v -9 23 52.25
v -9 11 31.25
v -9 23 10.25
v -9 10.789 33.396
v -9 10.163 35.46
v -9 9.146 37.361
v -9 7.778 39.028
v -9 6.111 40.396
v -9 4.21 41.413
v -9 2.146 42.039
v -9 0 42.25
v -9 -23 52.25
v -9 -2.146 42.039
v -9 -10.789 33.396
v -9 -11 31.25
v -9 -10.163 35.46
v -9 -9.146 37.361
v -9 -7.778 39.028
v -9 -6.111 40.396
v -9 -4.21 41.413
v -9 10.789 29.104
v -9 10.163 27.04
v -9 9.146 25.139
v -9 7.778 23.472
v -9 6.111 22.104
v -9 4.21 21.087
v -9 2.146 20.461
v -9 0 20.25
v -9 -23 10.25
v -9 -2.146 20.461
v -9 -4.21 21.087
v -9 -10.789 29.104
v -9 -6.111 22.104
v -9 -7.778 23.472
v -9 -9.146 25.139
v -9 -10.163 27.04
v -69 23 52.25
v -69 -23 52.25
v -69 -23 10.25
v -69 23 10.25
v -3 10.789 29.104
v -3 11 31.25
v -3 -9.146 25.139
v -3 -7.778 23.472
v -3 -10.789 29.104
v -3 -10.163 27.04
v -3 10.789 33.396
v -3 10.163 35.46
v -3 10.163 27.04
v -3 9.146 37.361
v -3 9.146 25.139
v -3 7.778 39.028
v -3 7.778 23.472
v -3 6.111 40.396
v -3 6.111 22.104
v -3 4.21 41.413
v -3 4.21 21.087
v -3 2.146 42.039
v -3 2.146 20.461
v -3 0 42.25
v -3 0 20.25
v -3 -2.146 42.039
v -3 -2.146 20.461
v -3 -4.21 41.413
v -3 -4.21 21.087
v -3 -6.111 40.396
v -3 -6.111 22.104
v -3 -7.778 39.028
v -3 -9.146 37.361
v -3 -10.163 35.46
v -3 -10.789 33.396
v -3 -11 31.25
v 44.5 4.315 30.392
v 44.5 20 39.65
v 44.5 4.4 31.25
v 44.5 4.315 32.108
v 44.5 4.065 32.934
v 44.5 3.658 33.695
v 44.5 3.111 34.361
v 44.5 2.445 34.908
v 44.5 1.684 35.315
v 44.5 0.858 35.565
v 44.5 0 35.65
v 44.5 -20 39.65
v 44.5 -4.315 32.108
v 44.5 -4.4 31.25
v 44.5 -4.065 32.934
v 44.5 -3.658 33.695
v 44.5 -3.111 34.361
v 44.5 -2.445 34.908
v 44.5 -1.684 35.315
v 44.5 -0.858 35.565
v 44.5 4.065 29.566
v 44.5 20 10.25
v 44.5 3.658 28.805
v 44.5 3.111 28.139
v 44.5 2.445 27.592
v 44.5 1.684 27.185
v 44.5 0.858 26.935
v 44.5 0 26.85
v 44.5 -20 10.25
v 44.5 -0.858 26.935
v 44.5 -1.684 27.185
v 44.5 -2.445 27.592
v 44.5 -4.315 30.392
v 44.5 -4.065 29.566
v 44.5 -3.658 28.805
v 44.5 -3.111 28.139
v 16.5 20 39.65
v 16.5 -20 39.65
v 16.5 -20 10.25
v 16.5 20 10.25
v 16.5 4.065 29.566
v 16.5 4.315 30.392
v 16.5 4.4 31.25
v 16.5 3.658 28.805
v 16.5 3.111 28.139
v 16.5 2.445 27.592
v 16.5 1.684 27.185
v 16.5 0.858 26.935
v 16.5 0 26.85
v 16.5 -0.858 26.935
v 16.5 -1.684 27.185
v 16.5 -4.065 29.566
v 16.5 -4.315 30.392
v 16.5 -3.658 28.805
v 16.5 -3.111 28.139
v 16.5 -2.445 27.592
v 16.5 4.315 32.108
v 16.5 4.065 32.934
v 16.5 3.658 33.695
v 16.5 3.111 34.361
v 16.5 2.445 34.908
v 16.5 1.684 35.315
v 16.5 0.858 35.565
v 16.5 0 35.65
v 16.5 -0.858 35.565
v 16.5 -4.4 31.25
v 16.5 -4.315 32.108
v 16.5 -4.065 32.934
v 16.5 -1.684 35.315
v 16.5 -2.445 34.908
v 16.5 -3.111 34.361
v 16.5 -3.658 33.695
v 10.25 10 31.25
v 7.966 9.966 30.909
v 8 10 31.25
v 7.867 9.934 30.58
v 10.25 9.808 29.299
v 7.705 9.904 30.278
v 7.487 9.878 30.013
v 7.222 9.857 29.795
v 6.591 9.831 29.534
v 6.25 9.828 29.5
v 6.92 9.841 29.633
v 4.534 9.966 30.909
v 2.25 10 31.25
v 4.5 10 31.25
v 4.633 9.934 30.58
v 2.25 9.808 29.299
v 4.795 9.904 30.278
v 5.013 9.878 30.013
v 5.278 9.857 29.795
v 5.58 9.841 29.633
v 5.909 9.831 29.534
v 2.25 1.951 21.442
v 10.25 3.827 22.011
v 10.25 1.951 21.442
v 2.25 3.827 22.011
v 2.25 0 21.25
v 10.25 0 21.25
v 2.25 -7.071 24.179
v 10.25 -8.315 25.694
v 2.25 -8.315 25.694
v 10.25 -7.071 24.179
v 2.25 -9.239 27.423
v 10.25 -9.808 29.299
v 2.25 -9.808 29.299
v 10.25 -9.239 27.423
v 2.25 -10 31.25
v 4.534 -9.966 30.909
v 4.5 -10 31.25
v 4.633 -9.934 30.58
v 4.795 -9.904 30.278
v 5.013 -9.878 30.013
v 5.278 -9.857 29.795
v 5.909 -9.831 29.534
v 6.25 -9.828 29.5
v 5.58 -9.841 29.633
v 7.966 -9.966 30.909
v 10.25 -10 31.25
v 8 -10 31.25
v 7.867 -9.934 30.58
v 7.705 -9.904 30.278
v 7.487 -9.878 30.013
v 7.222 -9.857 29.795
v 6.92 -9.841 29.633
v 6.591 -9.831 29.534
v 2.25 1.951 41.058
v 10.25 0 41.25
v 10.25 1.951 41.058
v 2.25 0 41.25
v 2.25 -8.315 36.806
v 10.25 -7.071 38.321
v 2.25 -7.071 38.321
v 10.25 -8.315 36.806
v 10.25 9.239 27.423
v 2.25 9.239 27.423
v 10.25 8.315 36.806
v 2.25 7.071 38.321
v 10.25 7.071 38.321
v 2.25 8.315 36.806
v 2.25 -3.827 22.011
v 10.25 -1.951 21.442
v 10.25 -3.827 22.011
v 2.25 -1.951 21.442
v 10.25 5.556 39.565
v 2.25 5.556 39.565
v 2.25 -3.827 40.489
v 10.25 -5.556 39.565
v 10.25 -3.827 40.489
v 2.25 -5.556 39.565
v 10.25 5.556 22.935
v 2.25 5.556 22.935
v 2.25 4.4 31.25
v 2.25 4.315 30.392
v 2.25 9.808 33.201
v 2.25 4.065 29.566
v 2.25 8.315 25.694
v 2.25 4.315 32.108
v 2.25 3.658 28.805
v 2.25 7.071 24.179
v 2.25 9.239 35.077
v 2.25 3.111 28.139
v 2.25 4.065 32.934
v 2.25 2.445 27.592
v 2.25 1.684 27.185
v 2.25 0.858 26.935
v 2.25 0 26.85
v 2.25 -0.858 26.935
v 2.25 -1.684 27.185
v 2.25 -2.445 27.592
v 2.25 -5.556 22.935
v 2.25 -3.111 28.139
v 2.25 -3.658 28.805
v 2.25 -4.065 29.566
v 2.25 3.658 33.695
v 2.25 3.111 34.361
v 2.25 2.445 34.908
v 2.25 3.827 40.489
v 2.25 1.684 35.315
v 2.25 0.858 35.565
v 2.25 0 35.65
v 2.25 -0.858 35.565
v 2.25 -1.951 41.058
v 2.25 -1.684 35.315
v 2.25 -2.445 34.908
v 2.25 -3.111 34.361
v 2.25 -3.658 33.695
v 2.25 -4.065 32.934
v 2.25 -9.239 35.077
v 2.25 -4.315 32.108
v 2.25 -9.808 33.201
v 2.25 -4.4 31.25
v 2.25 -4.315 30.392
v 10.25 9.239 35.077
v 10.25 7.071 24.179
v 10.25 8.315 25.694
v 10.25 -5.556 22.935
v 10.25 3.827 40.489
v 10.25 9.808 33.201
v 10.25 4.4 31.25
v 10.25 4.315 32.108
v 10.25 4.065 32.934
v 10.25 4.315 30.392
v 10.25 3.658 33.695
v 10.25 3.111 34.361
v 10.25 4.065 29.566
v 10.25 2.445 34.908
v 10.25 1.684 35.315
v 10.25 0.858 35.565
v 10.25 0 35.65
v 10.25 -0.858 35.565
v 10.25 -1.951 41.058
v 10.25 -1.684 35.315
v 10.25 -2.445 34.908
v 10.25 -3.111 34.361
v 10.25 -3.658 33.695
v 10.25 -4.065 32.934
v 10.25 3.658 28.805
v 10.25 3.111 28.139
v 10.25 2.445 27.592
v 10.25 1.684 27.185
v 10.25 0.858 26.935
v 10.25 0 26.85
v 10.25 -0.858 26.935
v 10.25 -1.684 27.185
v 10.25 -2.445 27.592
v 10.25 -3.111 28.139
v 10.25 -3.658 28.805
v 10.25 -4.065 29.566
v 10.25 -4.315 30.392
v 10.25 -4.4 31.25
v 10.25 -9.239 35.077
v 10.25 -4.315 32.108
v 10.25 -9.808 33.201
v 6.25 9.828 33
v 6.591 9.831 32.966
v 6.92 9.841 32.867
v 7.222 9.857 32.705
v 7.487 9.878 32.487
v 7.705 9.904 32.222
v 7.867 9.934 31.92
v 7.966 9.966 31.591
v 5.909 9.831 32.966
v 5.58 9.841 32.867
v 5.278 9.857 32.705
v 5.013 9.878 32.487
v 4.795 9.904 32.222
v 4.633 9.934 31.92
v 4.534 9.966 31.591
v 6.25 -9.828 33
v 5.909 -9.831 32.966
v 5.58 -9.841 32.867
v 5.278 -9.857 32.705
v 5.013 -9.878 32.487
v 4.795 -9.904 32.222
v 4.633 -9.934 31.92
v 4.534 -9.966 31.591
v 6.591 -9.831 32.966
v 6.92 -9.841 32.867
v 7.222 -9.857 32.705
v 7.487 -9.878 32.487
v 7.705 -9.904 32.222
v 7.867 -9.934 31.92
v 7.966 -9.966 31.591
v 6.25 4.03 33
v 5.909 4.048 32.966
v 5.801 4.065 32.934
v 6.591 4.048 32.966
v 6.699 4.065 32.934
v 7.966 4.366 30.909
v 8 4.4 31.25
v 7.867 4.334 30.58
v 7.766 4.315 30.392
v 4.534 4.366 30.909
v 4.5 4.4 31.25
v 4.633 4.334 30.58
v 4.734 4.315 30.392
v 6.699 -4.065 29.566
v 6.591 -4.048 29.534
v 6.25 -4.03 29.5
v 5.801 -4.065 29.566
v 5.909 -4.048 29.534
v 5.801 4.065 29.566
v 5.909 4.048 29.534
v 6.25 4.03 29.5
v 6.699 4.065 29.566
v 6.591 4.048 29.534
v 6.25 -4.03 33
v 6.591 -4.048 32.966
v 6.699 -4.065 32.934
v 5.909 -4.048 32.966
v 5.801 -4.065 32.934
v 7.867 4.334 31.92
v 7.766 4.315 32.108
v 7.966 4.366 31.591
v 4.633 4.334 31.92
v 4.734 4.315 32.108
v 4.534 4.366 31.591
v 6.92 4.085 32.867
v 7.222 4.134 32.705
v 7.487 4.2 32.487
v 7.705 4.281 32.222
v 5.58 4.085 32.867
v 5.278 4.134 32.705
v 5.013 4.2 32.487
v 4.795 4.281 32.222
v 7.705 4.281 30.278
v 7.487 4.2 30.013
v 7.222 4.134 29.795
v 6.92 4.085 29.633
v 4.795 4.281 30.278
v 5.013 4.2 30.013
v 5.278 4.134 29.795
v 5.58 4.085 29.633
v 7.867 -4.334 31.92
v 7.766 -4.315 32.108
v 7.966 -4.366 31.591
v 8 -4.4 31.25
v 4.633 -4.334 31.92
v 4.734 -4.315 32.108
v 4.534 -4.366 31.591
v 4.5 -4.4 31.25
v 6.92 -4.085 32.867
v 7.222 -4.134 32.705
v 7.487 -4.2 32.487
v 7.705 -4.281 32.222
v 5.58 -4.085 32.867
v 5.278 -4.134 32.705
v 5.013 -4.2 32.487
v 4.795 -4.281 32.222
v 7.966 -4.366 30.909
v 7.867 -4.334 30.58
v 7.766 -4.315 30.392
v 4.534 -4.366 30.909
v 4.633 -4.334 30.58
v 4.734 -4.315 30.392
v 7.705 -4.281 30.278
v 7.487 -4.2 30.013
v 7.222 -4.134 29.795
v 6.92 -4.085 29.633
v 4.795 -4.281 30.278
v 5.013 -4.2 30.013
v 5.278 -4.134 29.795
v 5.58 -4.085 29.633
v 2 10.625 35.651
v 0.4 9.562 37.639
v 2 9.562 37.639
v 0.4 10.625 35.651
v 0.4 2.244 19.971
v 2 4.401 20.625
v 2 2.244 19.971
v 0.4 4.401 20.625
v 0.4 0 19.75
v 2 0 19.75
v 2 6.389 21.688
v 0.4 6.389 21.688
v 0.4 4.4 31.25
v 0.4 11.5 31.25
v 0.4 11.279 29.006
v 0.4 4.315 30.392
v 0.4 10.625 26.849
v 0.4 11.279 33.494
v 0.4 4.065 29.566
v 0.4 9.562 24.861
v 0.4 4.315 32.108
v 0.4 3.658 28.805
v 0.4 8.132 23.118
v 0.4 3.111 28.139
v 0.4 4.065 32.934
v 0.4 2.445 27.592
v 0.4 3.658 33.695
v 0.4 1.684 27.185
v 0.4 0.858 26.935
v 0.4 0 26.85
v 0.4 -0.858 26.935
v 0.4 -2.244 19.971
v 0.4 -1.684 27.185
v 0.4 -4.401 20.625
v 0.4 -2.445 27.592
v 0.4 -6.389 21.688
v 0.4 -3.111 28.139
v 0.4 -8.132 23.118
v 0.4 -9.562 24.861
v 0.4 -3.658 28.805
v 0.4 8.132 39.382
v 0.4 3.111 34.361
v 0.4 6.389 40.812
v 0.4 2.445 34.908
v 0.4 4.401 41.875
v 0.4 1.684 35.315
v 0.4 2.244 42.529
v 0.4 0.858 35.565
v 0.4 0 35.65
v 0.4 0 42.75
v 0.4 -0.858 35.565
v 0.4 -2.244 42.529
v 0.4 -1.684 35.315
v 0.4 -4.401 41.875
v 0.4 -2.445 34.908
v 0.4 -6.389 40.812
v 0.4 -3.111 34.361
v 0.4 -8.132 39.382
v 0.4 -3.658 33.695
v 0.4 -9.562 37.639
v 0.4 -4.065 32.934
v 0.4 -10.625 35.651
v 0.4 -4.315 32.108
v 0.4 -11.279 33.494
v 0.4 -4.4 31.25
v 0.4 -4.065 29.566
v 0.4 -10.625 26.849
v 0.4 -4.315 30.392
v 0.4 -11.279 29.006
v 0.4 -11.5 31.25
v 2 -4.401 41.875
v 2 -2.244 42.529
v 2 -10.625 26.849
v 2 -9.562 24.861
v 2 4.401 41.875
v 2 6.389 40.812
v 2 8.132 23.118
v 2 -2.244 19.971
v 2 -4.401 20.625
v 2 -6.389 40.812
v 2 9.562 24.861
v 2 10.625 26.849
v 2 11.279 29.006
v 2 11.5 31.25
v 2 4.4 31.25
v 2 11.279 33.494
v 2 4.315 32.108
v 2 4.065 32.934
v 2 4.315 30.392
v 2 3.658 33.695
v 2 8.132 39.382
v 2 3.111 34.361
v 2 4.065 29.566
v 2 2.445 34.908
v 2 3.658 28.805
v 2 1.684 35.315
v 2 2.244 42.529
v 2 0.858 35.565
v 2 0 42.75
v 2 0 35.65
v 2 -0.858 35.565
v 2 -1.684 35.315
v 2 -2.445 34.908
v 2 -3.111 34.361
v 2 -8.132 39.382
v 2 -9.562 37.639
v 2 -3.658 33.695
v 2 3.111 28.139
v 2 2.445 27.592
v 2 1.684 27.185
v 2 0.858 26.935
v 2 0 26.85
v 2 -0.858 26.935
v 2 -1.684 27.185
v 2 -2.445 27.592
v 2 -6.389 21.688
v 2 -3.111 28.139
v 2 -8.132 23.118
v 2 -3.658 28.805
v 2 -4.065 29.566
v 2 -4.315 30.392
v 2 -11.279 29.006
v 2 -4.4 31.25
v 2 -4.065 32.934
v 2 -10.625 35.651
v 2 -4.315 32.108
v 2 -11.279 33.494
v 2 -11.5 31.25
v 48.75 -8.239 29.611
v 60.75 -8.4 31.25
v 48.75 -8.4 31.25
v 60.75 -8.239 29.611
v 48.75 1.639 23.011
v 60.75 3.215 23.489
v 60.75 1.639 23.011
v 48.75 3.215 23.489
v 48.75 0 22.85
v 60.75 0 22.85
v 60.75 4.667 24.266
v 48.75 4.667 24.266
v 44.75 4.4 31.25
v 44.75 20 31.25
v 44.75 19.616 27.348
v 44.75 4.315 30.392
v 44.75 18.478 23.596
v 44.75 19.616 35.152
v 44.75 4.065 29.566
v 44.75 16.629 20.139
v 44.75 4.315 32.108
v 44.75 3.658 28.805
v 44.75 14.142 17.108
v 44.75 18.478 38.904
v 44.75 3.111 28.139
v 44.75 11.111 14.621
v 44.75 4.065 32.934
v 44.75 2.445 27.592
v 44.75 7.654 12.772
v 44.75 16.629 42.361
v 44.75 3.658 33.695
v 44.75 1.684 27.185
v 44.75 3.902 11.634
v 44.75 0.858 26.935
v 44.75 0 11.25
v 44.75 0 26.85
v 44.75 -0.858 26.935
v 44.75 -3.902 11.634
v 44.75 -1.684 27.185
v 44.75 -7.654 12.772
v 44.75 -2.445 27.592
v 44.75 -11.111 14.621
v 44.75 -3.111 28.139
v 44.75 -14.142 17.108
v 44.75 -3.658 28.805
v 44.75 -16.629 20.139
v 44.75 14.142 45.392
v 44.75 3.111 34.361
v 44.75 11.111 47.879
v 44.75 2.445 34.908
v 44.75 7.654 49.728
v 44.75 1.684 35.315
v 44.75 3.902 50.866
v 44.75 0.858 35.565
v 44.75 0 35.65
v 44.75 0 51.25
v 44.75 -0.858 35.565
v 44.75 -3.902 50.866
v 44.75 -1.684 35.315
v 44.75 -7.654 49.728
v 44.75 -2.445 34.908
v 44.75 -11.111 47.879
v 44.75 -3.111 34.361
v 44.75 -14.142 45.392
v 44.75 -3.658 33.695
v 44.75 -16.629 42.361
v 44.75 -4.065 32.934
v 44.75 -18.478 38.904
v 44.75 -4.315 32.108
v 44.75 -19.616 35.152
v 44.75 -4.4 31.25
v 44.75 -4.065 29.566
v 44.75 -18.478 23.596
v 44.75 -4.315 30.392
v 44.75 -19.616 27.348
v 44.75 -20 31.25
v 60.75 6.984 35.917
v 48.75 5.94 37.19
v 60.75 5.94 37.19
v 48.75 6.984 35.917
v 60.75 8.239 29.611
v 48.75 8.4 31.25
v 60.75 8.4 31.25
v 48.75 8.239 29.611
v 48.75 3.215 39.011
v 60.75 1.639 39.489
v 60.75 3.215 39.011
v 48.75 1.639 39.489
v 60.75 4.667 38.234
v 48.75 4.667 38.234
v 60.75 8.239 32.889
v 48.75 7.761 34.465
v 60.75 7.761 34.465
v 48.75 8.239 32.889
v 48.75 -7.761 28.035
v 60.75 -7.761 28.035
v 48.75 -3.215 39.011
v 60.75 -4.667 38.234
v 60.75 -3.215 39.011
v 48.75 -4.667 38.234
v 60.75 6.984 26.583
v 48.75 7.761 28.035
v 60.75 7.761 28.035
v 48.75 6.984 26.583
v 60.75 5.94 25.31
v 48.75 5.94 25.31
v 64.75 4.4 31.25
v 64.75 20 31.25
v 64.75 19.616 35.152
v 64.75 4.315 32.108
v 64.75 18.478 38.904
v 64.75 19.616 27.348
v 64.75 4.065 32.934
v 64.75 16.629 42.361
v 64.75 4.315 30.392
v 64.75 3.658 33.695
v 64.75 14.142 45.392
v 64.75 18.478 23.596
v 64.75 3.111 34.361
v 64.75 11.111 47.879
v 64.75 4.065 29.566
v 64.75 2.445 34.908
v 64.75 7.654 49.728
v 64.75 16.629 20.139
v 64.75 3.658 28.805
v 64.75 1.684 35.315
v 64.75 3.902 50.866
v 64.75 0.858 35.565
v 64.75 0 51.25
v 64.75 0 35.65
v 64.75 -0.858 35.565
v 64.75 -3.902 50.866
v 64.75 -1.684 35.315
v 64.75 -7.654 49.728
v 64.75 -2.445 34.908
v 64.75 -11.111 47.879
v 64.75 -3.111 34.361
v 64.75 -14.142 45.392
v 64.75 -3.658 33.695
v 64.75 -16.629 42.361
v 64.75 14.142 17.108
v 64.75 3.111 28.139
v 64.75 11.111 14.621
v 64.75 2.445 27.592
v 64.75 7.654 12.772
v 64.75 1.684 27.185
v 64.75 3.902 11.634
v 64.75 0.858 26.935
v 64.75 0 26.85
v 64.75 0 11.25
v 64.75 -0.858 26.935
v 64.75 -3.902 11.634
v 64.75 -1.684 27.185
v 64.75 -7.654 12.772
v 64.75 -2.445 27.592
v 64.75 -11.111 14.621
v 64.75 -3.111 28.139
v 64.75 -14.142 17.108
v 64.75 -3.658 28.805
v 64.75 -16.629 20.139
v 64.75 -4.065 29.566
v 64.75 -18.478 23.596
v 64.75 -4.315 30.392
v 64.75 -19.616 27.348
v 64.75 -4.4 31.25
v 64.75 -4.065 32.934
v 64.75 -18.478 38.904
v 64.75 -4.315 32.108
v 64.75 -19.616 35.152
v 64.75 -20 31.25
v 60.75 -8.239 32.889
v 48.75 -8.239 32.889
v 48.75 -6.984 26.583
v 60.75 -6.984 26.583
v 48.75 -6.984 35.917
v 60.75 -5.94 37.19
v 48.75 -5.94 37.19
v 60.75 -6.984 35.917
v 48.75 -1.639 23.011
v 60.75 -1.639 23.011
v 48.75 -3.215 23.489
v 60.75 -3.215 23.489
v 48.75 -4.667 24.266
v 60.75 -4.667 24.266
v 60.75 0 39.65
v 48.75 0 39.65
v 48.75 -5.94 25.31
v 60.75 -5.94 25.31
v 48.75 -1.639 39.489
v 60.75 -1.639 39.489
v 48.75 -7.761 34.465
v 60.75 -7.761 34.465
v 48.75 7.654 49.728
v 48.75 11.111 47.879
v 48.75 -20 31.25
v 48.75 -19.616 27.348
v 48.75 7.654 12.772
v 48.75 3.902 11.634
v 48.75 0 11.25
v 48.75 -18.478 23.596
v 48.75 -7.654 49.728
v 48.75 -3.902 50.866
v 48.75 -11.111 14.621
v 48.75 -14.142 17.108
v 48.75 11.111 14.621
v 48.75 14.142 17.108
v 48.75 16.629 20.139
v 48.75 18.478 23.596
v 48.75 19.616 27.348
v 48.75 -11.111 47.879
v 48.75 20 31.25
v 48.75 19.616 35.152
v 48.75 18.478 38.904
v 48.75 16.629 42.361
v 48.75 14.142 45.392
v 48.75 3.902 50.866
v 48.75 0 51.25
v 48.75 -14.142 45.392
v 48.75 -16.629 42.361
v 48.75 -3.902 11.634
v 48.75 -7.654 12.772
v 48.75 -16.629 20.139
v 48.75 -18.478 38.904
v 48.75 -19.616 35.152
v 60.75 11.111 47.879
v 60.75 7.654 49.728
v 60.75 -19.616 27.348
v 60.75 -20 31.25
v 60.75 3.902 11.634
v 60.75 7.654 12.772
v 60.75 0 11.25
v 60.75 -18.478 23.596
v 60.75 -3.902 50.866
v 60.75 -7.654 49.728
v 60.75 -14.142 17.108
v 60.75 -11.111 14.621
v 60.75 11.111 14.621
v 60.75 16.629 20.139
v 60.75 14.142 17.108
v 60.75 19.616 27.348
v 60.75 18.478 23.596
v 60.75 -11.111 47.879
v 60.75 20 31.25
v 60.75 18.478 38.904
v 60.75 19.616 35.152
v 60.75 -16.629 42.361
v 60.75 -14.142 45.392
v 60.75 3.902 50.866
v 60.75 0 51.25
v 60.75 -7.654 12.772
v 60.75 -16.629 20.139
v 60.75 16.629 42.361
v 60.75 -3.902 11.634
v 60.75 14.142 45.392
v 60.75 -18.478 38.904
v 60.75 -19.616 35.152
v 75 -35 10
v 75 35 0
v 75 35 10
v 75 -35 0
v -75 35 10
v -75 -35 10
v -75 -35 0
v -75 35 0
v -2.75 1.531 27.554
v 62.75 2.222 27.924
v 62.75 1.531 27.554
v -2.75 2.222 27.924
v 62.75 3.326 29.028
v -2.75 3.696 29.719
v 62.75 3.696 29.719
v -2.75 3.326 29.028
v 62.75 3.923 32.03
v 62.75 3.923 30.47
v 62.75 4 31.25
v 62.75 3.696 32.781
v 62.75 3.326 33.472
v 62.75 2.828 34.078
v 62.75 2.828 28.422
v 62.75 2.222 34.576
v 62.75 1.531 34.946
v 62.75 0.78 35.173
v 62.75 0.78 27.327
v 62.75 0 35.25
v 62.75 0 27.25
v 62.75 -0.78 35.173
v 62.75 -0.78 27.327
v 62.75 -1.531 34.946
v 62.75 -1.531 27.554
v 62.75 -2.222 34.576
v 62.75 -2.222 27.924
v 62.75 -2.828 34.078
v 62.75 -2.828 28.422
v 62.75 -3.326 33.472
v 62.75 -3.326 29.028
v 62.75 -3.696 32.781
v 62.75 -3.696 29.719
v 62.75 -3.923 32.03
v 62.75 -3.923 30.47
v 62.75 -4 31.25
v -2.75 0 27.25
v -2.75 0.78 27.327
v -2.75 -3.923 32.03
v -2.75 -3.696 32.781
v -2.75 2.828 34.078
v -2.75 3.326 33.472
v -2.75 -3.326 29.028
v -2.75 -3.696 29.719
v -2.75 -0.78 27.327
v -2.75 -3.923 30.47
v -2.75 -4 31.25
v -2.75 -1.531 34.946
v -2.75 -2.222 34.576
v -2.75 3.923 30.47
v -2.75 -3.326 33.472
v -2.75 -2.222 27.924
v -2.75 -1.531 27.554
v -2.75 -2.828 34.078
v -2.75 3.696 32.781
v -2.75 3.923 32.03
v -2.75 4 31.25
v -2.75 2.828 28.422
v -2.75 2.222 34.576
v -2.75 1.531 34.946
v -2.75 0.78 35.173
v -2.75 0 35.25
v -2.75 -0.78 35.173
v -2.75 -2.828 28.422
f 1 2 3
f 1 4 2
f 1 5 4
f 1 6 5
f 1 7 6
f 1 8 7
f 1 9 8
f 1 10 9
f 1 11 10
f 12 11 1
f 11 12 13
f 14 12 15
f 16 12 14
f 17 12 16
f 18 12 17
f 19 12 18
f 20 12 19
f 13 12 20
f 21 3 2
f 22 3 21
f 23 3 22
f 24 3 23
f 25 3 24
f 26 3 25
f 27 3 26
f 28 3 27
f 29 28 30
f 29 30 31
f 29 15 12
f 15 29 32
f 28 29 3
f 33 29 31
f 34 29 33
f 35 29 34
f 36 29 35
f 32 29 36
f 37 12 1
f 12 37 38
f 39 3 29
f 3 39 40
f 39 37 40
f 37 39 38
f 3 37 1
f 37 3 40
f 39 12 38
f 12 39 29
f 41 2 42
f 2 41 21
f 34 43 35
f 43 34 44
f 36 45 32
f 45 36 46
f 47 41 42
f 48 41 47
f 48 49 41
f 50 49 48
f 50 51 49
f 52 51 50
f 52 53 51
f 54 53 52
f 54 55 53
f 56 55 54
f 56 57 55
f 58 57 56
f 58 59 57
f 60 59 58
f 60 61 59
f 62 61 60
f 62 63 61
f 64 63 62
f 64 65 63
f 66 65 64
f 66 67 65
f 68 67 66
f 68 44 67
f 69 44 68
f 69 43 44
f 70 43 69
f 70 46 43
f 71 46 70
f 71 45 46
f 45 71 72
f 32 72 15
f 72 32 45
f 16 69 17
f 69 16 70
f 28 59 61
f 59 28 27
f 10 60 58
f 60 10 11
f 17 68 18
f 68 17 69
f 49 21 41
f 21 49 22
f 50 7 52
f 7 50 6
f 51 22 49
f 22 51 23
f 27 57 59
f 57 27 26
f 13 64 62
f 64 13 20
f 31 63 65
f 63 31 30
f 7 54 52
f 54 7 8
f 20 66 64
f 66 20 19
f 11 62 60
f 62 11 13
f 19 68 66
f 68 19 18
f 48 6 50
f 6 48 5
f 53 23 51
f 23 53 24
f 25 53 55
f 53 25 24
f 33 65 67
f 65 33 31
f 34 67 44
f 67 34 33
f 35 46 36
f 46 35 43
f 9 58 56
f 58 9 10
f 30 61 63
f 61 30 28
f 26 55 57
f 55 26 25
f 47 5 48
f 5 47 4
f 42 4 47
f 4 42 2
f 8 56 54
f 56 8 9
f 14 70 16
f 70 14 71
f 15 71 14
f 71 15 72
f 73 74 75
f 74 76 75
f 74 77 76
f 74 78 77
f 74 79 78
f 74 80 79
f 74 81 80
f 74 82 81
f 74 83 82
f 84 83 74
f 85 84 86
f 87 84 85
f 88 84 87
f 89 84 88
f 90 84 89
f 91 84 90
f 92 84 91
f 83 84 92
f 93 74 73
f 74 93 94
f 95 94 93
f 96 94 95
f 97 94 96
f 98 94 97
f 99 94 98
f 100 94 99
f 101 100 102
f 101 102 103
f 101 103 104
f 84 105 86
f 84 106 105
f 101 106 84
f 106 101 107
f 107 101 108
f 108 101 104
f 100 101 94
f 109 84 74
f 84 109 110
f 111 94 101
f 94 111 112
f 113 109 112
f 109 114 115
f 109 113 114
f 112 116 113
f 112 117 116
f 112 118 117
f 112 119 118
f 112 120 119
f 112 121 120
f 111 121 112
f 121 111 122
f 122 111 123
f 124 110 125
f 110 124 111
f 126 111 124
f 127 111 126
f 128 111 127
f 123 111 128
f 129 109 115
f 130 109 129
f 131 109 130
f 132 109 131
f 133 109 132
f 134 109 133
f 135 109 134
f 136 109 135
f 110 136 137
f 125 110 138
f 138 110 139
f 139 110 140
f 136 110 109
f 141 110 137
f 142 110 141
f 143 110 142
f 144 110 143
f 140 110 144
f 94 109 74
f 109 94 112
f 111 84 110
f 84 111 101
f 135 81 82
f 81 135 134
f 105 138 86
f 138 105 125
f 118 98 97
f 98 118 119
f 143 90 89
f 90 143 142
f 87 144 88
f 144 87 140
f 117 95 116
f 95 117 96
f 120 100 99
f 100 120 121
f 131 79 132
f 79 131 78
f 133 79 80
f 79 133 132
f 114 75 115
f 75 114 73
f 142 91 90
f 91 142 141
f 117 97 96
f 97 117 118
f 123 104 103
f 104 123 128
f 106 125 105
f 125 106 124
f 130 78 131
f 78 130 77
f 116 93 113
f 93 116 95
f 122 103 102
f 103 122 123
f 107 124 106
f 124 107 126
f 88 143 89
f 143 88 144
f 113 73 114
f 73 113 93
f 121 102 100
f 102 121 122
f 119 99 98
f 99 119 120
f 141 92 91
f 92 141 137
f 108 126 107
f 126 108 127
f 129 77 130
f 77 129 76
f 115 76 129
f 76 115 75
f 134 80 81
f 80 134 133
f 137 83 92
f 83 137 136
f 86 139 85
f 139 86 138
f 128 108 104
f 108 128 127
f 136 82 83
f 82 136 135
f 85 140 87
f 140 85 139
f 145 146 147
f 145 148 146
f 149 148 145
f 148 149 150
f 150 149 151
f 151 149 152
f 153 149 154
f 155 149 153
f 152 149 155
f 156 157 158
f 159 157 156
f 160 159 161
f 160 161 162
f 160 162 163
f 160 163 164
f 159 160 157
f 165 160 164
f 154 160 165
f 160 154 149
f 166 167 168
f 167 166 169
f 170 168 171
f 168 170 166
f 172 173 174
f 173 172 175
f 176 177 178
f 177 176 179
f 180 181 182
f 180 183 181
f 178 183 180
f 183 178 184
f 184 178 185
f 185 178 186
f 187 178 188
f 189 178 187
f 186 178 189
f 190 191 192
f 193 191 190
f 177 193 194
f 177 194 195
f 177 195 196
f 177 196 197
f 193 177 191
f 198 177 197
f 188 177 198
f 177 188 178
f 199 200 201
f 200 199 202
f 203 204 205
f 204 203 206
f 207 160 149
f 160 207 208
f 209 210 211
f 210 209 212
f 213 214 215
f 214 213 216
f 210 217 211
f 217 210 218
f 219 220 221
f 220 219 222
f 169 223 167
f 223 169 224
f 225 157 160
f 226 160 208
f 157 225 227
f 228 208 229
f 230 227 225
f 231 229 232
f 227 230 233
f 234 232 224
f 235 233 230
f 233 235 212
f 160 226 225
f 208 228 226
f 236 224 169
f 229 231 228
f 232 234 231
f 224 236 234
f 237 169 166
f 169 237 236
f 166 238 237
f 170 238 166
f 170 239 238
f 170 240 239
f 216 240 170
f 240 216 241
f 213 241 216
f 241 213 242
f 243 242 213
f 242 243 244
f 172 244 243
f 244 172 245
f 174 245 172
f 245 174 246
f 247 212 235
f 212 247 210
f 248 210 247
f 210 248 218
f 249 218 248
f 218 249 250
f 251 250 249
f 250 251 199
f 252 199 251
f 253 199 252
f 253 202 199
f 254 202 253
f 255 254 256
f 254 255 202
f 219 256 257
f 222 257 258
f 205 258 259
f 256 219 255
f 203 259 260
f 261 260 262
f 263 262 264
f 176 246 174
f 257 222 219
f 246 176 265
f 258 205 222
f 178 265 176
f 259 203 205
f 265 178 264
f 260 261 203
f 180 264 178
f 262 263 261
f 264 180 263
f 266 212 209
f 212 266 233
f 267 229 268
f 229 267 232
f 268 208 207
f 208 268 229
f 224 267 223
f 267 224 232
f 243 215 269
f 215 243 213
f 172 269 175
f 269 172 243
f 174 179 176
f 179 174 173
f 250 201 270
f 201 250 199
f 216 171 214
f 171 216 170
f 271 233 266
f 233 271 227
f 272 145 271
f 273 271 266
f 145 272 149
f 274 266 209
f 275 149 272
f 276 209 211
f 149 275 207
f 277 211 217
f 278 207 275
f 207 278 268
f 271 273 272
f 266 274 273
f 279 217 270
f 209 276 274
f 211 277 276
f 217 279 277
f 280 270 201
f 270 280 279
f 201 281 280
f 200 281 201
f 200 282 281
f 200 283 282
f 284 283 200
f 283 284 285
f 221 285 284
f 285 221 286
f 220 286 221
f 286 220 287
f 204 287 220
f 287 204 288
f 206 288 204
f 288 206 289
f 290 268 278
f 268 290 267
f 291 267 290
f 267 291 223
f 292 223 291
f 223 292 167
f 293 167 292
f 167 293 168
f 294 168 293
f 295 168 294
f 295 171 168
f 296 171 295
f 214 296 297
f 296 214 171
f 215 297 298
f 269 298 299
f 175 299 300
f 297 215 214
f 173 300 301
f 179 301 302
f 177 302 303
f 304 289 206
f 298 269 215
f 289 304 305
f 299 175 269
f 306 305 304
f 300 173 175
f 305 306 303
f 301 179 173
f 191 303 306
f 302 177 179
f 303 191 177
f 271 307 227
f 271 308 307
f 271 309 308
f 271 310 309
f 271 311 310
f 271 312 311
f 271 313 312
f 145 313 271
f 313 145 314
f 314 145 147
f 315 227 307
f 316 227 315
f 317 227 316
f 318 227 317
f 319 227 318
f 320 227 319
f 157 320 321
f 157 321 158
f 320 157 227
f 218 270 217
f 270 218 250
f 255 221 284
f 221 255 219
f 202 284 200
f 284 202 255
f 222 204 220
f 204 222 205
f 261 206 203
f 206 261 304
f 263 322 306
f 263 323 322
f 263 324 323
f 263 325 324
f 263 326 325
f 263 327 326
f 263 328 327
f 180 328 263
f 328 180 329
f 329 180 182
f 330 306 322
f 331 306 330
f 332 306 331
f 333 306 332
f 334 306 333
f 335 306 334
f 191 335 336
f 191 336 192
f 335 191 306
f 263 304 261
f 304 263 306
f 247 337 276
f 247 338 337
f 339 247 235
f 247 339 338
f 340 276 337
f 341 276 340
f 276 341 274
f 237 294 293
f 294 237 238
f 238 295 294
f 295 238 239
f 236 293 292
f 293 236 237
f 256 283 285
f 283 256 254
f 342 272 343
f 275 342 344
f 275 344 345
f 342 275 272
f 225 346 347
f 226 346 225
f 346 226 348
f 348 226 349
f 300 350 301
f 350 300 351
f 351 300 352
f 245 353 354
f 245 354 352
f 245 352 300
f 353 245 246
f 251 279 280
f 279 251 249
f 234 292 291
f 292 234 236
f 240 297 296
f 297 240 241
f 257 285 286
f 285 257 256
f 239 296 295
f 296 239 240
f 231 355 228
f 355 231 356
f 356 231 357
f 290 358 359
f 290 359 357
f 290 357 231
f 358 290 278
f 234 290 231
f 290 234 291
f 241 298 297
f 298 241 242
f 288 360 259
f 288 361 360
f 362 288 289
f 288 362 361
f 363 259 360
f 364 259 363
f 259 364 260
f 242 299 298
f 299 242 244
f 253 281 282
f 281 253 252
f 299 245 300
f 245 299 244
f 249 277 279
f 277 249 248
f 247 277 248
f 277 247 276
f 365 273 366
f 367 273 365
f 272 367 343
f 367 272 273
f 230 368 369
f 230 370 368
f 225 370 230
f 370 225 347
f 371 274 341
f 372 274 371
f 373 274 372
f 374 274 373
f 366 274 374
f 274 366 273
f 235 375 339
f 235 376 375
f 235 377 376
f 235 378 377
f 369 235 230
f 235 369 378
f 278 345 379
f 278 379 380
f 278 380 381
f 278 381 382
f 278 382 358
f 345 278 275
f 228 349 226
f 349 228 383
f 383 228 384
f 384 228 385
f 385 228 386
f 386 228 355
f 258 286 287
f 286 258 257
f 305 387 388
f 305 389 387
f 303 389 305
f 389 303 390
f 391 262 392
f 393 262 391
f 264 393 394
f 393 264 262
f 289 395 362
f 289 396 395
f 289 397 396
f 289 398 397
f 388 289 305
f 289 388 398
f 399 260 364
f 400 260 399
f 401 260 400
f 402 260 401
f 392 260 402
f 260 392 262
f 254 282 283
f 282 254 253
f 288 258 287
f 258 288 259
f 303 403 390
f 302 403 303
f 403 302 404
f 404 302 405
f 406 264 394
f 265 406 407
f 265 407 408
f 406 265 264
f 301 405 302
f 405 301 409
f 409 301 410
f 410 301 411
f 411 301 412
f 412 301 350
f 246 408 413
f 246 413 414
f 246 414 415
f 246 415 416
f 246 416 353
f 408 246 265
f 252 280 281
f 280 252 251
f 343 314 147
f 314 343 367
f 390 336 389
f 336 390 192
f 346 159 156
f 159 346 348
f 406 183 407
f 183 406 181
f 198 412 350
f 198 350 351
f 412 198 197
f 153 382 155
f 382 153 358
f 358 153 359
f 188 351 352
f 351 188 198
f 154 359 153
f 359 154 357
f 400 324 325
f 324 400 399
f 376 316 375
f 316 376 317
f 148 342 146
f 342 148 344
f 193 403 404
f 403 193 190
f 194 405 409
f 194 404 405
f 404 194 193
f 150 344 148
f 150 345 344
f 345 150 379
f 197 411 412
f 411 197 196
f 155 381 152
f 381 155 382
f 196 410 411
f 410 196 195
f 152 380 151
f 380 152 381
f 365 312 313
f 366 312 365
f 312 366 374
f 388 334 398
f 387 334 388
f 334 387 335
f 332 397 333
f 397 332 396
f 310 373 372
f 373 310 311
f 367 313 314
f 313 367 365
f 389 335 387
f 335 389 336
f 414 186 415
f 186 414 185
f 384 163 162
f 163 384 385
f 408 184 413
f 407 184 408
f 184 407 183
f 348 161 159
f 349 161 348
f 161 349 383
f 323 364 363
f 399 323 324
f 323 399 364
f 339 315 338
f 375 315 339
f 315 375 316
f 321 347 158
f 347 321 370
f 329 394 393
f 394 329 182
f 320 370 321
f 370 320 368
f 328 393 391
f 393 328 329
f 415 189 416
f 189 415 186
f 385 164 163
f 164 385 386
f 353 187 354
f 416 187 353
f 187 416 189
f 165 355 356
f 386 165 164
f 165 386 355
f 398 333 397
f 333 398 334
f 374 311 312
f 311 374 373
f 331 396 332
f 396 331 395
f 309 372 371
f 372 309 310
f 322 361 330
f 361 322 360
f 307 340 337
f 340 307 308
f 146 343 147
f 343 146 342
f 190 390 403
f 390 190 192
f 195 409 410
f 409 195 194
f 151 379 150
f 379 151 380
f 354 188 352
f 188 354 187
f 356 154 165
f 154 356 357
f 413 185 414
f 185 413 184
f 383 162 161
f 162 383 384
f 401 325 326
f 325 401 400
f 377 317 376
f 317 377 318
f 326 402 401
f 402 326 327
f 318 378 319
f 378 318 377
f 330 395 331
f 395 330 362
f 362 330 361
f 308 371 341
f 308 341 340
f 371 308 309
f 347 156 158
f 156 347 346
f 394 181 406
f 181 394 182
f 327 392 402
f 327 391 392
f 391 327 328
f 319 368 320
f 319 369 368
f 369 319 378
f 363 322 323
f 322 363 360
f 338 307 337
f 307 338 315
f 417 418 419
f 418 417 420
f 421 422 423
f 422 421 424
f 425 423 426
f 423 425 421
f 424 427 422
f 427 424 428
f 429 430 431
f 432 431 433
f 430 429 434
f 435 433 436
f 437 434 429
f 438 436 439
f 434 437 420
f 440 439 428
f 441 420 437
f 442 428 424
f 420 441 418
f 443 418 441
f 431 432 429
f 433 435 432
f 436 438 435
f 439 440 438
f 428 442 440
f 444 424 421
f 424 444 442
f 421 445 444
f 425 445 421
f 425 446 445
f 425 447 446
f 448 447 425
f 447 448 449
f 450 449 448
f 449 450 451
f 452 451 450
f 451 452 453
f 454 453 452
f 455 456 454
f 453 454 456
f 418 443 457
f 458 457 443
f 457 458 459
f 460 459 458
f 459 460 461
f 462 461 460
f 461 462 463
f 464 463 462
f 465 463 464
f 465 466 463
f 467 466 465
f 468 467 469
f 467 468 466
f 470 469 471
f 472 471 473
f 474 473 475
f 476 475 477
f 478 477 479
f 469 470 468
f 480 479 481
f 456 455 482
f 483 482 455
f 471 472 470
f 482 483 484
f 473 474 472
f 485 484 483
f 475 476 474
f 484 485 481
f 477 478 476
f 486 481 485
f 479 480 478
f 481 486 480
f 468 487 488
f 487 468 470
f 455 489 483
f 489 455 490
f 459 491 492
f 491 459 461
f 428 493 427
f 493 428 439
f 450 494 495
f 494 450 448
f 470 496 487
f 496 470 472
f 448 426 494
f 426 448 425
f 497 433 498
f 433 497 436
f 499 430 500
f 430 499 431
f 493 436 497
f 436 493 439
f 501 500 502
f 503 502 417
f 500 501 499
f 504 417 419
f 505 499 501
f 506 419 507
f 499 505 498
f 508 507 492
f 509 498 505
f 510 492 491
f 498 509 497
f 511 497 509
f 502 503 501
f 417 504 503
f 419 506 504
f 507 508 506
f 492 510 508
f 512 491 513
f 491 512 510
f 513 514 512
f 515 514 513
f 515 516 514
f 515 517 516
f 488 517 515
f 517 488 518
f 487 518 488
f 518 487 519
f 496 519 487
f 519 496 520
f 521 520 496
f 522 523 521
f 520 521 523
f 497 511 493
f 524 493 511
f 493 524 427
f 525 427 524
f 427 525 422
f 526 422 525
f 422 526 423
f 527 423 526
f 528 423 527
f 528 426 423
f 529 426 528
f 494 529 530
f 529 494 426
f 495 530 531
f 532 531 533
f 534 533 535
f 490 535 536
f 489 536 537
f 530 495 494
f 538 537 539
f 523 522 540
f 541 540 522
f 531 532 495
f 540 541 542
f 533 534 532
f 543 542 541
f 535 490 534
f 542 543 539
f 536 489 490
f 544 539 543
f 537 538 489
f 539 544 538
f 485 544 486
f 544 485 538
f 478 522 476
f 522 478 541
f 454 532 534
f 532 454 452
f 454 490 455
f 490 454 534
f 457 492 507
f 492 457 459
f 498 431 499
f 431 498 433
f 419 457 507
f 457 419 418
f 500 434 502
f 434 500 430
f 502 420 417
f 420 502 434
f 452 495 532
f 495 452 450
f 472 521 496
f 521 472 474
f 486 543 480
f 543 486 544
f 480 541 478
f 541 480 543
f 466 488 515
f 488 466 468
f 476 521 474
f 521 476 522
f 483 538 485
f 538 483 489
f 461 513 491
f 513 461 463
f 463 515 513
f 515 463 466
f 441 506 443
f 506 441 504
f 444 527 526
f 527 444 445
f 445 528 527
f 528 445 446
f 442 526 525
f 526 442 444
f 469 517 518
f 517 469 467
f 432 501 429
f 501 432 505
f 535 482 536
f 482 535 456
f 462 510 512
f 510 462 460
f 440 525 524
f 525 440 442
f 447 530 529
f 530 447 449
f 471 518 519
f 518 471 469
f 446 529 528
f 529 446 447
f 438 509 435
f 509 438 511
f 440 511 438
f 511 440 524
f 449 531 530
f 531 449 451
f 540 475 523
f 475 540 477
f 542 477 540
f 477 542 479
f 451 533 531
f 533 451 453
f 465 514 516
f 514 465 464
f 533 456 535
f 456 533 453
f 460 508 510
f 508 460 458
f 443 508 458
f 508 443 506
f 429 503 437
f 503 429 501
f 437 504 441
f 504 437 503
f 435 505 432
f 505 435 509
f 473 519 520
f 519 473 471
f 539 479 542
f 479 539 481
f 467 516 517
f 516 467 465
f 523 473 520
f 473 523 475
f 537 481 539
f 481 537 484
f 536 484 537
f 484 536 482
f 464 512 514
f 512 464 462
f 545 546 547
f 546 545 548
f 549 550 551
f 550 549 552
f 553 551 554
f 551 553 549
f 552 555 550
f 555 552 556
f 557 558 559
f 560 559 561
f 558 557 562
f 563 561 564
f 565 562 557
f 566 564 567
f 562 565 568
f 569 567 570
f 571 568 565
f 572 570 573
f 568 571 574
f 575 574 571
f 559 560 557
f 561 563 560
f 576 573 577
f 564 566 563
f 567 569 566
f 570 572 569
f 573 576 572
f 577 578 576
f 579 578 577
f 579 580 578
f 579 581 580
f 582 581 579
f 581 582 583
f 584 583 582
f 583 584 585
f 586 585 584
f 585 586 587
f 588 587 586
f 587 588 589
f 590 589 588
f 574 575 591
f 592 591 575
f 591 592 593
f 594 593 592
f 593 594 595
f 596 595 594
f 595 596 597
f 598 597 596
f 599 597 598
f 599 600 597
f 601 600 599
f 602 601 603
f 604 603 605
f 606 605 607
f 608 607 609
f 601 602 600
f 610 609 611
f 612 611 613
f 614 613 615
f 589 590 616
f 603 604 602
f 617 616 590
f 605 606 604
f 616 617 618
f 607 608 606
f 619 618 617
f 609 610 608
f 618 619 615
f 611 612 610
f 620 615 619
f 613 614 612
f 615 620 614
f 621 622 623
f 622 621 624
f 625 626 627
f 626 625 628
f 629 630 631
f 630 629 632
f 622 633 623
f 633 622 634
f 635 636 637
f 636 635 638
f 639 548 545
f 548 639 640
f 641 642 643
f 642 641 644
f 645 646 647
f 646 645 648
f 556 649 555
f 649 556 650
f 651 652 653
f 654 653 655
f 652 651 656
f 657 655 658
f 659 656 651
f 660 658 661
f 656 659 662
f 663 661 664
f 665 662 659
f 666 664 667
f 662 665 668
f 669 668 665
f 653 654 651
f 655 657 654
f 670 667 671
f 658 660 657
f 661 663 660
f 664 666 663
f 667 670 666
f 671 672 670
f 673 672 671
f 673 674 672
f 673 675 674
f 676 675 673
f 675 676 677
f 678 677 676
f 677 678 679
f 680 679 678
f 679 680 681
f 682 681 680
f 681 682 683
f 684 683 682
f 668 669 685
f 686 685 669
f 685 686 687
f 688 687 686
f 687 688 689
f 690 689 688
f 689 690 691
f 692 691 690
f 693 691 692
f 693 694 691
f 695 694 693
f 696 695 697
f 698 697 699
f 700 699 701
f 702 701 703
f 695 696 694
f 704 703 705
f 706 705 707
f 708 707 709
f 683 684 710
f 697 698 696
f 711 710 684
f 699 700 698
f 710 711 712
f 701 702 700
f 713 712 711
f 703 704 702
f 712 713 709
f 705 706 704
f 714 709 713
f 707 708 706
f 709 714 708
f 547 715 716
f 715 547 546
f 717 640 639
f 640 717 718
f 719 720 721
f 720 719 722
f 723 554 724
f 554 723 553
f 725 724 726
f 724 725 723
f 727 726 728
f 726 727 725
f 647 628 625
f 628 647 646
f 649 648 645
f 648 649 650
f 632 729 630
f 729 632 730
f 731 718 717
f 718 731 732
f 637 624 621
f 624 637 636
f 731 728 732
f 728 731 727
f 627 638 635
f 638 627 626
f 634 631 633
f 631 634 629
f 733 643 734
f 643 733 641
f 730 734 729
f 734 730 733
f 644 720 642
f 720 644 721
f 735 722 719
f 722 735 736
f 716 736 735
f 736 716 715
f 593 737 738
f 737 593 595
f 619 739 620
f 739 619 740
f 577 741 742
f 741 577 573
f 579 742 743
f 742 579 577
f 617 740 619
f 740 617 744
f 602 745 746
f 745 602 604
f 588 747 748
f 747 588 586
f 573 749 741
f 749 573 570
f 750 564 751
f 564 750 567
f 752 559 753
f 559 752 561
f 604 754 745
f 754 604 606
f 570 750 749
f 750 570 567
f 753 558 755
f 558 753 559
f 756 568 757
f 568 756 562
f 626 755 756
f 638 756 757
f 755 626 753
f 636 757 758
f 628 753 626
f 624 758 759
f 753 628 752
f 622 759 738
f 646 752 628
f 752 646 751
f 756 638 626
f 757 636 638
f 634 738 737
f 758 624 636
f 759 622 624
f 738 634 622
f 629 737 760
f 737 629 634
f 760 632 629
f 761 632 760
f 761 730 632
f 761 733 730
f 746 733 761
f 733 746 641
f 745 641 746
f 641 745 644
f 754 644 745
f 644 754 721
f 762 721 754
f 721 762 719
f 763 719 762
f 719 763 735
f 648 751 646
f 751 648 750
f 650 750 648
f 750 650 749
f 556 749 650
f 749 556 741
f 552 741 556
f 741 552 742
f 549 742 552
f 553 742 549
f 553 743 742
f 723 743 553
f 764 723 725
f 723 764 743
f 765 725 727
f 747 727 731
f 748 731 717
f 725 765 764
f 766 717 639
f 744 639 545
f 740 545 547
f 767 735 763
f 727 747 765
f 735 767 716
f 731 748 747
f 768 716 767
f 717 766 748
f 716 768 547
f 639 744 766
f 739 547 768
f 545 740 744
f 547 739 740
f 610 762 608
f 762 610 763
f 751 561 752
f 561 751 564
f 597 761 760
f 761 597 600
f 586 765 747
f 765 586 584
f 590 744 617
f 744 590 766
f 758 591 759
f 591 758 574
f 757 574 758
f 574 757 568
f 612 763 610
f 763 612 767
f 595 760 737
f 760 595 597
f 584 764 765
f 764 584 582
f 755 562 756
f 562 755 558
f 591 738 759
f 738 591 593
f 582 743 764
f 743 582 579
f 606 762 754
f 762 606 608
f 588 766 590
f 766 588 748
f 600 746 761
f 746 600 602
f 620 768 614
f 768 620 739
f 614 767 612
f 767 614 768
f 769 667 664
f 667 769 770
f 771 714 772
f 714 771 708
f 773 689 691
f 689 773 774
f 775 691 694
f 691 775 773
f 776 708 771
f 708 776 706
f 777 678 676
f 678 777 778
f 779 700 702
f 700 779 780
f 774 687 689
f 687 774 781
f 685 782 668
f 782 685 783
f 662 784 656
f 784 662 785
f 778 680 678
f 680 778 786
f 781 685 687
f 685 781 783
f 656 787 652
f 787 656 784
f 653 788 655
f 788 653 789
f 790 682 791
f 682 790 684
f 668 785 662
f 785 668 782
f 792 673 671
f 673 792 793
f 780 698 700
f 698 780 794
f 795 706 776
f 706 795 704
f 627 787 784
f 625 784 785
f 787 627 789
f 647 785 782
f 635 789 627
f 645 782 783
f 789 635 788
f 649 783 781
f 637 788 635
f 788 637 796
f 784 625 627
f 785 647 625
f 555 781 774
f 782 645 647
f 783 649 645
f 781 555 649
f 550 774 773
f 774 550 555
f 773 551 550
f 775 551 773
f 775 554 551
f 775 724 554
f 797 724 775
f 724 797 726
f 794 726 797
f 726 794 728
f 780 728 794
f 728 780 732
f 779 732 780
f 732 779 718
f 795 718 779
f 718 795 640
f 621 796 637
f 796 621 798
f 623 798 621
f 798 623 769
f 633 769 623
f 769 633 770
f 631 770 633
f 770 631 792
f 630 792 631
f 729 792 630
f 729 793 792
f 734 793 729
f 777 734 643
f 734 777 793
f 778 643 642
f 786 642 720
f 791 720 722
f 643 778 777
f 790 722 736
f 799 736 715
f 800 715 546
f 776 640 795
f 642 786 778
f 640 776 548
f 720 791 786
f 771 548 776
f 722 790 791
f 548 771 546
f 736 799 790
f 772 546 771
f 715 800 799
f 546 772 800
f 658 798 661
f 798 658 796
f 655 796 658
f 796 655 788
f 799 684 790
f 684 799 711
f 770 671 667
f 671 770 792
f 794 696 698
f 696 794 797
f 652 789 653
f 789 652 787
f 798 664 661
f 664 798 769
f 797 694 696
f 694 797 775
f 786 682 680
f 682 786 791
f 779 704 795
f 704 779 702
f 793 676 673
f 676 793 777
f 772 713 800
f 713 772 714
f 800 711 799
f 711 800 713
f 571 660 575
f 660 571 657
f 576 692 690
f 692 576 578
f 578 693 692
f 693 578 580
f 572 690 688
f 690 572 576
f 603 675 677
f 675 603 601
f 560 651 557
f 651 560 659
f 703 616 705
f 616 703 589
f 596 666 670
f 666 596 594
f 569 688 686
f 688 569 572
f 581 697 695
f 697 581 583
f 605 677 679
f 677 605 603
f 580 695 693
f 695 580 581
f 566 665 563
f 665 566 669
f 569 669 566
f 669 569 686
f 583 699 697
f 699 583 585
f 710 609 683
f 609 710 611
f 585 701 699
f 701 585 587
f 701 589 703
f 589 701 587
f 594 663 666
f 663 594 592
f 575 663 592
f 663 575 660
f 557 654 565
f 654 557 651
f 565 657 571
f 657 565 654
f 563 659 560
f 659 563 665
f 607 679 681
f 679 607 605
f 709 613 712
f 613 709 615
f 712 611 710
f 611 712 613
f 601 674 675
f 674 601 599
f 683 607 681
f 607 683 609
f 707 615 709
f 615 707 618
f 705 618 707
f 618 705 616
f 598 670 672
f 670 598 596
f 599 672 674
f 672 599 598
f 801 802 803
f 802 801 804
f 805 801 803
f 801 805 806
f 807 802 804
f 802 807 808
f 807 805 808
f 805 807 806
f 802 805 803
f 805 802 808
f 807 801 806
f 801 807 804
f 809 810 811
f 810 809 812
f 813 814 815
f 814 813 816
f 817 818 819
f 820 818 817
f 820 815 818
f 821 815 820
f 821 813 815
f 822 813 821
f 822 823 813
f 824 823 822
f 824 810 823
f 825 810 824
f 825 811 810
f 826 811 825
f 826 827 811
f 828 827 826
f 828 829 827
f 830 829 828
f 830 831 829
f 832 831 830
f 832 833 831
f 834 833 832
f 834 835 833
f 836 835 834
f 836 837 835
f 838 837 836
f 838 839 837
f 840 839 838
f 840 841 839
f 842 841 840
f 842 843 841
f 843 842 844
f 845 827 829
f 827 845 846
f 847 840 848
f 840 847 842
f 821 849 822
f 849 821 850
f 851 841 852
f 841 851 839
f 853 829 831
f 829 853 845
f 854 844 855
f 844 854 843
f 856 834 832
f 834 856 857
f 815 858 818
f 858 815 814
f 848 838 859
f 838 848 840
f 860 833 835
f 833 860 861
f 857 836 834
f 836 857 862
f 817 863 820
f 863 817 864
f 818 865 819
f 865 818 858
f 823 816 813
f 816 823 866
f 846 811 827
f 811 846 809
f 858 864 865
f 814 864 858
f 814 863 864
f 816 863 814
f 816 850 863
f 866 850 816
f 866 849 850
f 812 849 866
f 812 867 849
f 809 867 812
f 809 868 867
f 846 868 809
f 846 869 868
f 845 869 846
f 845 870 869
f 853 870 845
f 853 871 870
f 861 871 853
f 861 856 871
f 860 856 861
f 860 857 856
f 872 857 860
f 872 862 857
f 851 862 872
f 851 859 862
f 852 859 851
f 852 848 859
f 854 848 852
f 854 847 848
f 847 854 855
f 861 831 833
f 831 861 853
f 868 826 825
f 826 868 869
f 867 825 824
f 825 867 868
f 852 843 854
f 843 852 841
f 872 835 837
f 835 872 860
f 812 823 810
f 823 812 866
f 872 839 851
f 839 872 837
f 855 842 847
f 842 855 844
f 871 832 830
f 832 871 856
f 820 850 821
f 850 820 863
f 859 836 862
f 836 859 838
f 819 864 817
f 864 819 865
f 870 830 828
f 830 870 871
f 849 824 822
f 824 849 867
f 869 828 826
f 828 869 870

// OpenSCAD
$fn = 32;

// ------------------------------------------------------------------------
// Motor drive station: motor 60 x 42 mm, shaft d8, pulley d40
// Every part is its own module, assembly() places every instance.
// ------------------------------------------------------------------------

// --- part 1 ---
module station_bed() {
  difference() {
    translate([-75, -35, 0]) cube([150, 70, 10]);
  }
}

// --- part 2 ---
module drive_motor() {
  union() {
    translate([-30, -23, 0]) cube([60, 46, 42]);
    translate([33, 0, 21]) rotate([0, 90, 0]) cylinder(h = 6, d = 22, center = true);
  }
}

// --- part 3 ---
module pillow_block() {
  difference() {
    translate([-14, -20, 0]) cube([28, 40, 29.4]);
    translate([0, 0, 21]) rotate([0, 90, 0]) cylinder(h = 30, d = 8.8, center = true);
  }
}

// --- part 4 ---
module drive_shaft() {
  translate([0, 0, -32.75]) cylinder(h = 65.5, d = 8);
}

// --- part 5 ---
module shaft_collar() {
  difference() {
    cylinder(h = 8, d = 20);
    translate([0, 0, -1]) cylinder(h = 10, d = 8.8);
    translate([0, 0, 4]) rotate([90, 0, 0]) cylinder(h = 22, d = 3.5, center = true);
  }
}

// --- part 6 ---
module collar_washer() {
  difference() {
      translate([0, 0, 0]) cylinder(h = 1.6, d = 23);
      translate([0, 0, -1]) cylinder(h = 3.6, d = 8.8);
    }
}

// --- part 7 ---
module drive_pulley() {
  difference() {
    union() {
      cylinder(h = 20, d = 16.8);
      cylinder(h = 4, d = 40);
      translate([0, 0, 16]) cylinder(h = 4, d = 40);
    }
    translate([0, 0, -1]) cylinder(h = 22, d = 8.8);
  }
}

// --- assembly ---
module assembly() {
  color([0.80, 0.24, 0.20]) translate([0, 0, 0]) rotate([0, 0, 0]) station_bed();
  color([0.20, 0.45, 0.75]) translate([-39, 0, 10.25]) rotate([0, 0, 0]) drive_motor();
  color([0.25, 0.62, 0.32]) translate([30.5, 0, 10.25]) rotate([0, 0, 0]) pillow_block();
  color([0.92, 0.70, 0.18]) translate([30, 0, 31.25]) rotate([0, 90, 0]) drive_shaft();
  color([0.58, 0.35, 0.70]) translate([2.25, 0, 31.25]) rotate([0, 90, 0]) shaft_collar();
  color([0.16, 0.66, 0.66]) translate([0.4, 0, 31.25]) rotate([0, 90, 0]) collar_washer();
  color([0.85, 0.48, 0.18]) translate([44.75, 0, 31.25]) rotate([0, 90, 0]) drive_pulley();
}

assembly();
